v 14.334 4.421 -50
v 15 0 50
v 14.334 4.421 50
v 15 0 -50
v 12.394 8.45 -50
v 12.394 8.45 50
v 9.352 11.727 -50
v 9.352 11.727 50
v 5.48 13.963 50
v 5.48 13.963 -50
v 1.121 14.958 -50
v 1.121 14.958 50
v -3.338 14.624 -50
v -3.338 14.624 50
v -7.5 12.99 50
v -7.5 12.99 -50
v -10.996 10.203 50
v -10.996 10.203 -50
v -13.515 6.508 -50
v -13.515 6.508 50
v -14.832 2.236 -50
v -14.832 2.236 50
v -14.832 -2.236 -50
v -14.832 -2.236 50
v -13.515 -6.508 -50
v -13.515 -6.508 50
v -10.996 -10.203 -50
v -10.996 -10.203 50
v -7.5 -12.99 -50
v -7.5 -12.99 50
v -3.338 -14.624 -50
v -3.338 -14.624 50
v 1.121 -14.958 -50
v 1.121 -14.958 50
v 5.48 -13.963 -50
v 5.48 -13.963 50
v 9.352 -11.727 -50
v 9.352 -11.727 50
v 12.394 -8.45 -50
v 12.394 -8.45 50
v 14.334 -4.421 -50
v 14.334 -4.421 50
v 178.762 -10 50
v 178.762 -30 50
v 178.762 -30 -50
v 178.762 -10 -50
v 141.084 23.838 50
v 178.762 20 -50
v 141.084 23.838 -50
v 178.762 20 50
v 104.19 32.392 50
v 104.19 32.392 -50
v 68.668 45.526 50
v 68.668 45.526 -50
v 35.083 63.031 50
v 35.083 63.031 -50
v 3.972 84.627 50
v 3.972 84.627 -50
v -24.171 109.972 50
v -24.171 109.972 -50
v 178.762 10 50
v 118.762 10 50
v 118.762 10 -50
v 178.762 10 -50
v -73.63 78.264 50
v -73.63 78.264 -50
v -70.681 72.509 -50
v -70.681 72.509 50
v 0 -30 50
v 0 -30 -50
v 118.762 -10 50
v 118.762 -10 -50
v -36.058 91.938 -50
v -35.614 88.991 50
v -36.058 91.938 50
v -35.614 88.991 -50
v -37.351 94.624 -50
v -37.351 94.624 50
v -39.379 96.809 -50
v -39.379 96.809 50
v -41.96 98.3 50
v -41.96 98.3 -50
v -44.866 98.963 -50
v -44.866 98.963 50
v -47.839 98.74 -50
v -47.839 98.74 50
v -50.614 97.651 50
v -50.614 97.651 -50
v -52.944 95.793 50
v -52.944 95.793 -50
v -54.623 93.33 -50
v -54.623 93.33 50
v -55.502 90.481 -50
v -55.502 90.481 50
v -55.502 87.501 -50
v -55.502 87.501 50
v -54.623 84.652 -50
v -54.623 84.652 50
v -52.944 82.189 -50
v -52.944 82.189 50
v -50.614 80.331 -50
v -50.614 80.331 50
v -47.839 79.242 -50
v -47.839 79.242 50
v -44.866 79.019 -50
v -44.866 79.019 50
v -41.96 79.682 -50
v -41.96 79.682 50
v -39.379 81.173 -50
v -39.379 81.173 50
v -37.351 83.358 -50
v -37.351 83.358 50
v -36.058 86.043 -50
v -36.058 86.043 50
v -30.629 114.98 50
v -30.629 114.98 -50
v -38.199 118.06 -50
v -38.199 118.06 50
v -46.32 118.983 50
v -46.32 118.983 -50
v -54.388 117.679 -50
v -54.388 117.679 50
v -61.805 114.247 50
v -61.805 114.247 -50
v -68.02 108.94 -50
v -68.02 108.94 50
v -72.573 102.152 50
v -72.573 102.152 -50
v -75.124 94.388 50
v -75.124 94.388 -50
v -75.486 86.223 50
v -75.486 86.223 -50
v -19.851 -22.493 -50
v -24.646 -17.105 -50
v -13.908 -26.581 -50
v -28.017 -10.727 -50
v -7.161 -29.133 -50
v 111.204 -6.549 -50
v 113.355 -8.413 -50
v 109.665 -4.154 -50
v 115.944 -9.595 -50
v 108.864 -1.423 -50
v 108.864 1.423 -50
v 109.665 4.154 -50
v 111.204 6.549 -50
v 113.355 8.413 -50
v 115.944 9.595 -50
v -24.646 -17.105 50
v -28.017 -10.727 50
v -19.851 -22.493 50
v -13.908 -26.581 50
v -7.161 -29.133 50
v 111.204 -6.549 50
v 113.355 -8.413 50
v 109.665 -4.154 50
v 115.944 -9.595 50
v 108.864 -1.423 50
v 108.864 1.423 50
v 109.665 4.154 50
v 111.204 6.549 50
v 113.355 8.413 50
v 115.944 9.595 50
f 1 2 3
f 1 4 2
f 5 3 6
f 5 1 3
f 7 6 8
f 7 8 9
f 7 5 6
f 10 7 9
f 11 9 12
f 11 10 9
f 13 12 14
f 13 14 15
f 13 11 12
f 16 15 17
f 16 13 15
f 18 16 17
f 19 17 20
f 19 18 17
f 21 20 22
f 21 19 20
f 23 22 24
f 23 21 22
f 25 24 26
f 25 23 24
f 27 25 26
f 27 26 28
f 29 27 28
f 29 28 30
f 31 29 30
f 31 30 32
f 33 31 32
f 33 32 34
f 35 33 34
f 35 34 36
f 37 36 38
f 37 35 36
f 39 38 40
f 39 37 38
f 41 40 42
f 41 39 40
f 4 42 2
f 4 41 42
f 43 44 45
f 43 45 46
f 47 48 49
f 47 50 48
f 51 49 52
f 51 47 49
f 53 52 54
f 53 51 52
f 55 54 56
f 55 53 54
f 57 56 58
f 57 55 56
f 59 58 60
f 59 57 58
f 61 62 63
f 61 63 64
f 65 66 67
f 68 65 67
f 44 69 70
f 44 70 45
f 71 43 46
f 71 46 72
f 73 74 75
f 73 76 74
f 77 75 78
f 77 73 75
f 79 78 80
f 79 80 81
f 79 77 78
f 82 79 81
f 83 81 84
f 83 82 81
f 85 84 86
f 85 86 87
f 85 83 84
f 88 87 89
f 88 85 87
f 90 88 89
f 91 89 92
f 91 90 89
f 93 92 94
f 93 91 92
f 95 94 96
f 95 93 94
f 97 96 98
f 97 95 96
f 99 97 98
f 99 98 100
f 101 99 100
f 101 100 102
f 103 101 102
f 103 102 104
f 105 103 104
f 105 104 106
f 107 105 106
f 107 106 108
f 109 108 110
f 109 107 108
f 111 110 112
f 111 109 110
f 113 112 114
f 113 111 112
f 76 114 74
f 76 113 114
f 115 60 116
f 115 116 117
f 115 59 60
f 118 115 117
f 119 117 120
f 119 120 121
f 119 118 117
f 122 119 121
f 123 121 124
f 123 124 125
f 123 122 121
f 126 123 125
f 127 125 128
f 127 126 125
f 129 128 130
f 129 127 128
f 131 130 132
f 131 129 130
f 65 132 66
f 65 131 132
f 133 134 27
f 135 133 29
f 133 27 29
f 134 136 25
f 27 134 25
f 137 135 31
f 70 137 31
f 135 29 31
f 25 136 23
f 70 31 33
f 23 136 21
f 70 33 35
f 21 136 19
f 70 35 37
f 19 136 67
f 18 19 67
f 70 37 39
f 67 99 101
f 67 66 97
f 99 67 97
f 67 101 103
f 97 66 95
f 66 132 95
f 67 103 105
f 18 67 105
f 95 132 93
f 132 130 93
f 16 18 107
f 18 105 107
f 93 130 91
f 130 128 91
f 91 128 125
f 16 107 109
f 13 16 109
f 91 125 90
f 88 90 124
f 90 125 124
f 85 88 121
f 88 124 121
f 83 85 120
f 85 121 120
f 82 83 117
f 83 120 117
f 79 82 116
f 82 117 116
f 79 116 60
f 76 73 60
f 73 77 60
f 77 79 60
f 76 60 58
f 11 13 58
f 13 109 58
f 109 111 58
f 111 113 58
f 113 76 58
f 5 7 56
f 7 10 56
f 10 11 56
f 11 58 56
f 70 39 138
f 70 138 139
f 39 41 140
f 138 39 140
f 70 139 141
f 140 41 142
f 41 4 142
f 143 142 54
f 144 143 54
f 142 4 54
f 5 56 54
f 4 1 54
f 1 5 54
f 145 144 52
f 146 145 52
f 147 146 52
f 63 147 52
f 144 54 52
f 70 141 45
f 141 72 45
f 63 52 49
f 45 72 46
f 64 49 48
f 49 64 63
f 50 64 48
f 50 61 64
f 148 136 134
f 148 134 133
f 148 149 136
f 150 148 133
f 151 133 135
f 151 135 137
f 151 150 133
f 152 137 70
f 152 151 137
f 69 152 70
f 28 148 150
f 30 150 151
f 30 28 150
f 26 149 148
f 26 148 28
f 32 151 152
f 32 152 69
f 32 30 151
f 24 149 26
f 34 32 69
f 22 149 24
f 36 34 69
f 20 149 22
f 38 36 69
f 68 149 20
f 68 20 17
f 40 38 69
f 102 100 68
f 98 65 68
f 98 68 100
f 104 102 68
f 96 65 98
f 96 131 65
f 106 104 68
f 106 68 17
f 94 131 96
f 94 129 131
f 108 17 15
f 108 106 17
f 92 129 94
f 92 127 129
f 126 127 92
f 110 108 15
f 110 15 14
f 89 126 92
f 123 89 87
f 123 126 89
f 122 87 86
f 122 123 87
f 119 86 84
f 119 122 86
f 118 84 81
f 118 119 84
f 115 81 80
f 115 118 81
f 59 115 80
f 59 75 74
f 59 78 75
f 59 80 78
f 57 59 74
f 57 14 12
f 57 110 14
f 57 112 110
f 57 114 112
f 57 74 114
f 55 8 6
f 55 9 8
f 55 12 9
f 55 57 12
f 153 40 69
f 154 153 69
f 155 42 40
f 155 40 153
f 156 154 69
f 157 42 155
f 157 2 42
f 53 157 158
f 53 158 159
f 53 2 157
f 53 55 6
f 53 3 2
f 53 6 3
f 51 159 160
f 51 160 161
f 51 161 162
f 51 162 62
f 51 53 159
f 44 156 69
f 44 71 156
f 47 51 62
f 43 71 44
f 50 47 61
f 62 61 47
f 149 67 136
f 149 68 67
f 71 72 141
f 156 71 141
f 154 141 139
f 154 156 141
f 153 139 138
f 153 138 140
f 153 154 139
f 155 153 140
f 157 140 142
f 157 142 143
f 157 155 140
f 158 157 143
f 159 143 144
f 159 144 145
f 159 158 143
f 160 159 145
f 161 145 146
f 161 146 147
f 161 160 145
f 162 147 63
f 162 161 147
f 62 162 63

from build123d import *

# Parameters (mm, degrees)
SKETCH3_R           = 15
SKETCH3_R_2         = 10
BOSS_EXTRUDE1_DEPTH = 50


with BuildPart() as part:
    # Sketch3 → Boss-Extrude1 (new, symmetric)
    with BuildSketch(Plane.XY):
        with BuildLine():
            ThreePointArc((-28.016593122, -10.72709233), (-17.002753161, -24.716520486), (0, -30))
            Line((0, -30), (178.761781376, -30))
            Line((178.761781376, -30), (178.761781376, -10))
            Line((178.761781376, -10), (118.761781376, -10))
            ThreePointArc((118.761781376, -10), (108.761781376, 0), (118.761781376, 10))
            Line((118.761781376, 10), (178.761781376, 10))
            Line((178.761781376, 10), (178.761781376, 20))
            ThreePointArc((178.761781376, 20), (68.667725633, 45.525627999), (-24.170625815, 109.971724042))
            ThreePointArc((-24.170625815, 109.971724042), (-61.804778357, 114.246632888), (-73.630323726, 78.263848671))
            Line((-73.630323726, 78.263848671), (-70.680690942, 72.509208706))
            Line((-70.680690942, 72.509208706), (-28.016593122, -10.72709233))
        make_face()
        Circle(SKETCH3_R, mode=Mode.SUBTRACT)
        with Locations((-45.613730605, 88.990941002)):
            Circle(SKETCH3_R_2, mode=Mode.SUBTRACT)
    extrude(amount=BOSS_EXTRUDE1_DEPTH, both=True)


solid = part.part
